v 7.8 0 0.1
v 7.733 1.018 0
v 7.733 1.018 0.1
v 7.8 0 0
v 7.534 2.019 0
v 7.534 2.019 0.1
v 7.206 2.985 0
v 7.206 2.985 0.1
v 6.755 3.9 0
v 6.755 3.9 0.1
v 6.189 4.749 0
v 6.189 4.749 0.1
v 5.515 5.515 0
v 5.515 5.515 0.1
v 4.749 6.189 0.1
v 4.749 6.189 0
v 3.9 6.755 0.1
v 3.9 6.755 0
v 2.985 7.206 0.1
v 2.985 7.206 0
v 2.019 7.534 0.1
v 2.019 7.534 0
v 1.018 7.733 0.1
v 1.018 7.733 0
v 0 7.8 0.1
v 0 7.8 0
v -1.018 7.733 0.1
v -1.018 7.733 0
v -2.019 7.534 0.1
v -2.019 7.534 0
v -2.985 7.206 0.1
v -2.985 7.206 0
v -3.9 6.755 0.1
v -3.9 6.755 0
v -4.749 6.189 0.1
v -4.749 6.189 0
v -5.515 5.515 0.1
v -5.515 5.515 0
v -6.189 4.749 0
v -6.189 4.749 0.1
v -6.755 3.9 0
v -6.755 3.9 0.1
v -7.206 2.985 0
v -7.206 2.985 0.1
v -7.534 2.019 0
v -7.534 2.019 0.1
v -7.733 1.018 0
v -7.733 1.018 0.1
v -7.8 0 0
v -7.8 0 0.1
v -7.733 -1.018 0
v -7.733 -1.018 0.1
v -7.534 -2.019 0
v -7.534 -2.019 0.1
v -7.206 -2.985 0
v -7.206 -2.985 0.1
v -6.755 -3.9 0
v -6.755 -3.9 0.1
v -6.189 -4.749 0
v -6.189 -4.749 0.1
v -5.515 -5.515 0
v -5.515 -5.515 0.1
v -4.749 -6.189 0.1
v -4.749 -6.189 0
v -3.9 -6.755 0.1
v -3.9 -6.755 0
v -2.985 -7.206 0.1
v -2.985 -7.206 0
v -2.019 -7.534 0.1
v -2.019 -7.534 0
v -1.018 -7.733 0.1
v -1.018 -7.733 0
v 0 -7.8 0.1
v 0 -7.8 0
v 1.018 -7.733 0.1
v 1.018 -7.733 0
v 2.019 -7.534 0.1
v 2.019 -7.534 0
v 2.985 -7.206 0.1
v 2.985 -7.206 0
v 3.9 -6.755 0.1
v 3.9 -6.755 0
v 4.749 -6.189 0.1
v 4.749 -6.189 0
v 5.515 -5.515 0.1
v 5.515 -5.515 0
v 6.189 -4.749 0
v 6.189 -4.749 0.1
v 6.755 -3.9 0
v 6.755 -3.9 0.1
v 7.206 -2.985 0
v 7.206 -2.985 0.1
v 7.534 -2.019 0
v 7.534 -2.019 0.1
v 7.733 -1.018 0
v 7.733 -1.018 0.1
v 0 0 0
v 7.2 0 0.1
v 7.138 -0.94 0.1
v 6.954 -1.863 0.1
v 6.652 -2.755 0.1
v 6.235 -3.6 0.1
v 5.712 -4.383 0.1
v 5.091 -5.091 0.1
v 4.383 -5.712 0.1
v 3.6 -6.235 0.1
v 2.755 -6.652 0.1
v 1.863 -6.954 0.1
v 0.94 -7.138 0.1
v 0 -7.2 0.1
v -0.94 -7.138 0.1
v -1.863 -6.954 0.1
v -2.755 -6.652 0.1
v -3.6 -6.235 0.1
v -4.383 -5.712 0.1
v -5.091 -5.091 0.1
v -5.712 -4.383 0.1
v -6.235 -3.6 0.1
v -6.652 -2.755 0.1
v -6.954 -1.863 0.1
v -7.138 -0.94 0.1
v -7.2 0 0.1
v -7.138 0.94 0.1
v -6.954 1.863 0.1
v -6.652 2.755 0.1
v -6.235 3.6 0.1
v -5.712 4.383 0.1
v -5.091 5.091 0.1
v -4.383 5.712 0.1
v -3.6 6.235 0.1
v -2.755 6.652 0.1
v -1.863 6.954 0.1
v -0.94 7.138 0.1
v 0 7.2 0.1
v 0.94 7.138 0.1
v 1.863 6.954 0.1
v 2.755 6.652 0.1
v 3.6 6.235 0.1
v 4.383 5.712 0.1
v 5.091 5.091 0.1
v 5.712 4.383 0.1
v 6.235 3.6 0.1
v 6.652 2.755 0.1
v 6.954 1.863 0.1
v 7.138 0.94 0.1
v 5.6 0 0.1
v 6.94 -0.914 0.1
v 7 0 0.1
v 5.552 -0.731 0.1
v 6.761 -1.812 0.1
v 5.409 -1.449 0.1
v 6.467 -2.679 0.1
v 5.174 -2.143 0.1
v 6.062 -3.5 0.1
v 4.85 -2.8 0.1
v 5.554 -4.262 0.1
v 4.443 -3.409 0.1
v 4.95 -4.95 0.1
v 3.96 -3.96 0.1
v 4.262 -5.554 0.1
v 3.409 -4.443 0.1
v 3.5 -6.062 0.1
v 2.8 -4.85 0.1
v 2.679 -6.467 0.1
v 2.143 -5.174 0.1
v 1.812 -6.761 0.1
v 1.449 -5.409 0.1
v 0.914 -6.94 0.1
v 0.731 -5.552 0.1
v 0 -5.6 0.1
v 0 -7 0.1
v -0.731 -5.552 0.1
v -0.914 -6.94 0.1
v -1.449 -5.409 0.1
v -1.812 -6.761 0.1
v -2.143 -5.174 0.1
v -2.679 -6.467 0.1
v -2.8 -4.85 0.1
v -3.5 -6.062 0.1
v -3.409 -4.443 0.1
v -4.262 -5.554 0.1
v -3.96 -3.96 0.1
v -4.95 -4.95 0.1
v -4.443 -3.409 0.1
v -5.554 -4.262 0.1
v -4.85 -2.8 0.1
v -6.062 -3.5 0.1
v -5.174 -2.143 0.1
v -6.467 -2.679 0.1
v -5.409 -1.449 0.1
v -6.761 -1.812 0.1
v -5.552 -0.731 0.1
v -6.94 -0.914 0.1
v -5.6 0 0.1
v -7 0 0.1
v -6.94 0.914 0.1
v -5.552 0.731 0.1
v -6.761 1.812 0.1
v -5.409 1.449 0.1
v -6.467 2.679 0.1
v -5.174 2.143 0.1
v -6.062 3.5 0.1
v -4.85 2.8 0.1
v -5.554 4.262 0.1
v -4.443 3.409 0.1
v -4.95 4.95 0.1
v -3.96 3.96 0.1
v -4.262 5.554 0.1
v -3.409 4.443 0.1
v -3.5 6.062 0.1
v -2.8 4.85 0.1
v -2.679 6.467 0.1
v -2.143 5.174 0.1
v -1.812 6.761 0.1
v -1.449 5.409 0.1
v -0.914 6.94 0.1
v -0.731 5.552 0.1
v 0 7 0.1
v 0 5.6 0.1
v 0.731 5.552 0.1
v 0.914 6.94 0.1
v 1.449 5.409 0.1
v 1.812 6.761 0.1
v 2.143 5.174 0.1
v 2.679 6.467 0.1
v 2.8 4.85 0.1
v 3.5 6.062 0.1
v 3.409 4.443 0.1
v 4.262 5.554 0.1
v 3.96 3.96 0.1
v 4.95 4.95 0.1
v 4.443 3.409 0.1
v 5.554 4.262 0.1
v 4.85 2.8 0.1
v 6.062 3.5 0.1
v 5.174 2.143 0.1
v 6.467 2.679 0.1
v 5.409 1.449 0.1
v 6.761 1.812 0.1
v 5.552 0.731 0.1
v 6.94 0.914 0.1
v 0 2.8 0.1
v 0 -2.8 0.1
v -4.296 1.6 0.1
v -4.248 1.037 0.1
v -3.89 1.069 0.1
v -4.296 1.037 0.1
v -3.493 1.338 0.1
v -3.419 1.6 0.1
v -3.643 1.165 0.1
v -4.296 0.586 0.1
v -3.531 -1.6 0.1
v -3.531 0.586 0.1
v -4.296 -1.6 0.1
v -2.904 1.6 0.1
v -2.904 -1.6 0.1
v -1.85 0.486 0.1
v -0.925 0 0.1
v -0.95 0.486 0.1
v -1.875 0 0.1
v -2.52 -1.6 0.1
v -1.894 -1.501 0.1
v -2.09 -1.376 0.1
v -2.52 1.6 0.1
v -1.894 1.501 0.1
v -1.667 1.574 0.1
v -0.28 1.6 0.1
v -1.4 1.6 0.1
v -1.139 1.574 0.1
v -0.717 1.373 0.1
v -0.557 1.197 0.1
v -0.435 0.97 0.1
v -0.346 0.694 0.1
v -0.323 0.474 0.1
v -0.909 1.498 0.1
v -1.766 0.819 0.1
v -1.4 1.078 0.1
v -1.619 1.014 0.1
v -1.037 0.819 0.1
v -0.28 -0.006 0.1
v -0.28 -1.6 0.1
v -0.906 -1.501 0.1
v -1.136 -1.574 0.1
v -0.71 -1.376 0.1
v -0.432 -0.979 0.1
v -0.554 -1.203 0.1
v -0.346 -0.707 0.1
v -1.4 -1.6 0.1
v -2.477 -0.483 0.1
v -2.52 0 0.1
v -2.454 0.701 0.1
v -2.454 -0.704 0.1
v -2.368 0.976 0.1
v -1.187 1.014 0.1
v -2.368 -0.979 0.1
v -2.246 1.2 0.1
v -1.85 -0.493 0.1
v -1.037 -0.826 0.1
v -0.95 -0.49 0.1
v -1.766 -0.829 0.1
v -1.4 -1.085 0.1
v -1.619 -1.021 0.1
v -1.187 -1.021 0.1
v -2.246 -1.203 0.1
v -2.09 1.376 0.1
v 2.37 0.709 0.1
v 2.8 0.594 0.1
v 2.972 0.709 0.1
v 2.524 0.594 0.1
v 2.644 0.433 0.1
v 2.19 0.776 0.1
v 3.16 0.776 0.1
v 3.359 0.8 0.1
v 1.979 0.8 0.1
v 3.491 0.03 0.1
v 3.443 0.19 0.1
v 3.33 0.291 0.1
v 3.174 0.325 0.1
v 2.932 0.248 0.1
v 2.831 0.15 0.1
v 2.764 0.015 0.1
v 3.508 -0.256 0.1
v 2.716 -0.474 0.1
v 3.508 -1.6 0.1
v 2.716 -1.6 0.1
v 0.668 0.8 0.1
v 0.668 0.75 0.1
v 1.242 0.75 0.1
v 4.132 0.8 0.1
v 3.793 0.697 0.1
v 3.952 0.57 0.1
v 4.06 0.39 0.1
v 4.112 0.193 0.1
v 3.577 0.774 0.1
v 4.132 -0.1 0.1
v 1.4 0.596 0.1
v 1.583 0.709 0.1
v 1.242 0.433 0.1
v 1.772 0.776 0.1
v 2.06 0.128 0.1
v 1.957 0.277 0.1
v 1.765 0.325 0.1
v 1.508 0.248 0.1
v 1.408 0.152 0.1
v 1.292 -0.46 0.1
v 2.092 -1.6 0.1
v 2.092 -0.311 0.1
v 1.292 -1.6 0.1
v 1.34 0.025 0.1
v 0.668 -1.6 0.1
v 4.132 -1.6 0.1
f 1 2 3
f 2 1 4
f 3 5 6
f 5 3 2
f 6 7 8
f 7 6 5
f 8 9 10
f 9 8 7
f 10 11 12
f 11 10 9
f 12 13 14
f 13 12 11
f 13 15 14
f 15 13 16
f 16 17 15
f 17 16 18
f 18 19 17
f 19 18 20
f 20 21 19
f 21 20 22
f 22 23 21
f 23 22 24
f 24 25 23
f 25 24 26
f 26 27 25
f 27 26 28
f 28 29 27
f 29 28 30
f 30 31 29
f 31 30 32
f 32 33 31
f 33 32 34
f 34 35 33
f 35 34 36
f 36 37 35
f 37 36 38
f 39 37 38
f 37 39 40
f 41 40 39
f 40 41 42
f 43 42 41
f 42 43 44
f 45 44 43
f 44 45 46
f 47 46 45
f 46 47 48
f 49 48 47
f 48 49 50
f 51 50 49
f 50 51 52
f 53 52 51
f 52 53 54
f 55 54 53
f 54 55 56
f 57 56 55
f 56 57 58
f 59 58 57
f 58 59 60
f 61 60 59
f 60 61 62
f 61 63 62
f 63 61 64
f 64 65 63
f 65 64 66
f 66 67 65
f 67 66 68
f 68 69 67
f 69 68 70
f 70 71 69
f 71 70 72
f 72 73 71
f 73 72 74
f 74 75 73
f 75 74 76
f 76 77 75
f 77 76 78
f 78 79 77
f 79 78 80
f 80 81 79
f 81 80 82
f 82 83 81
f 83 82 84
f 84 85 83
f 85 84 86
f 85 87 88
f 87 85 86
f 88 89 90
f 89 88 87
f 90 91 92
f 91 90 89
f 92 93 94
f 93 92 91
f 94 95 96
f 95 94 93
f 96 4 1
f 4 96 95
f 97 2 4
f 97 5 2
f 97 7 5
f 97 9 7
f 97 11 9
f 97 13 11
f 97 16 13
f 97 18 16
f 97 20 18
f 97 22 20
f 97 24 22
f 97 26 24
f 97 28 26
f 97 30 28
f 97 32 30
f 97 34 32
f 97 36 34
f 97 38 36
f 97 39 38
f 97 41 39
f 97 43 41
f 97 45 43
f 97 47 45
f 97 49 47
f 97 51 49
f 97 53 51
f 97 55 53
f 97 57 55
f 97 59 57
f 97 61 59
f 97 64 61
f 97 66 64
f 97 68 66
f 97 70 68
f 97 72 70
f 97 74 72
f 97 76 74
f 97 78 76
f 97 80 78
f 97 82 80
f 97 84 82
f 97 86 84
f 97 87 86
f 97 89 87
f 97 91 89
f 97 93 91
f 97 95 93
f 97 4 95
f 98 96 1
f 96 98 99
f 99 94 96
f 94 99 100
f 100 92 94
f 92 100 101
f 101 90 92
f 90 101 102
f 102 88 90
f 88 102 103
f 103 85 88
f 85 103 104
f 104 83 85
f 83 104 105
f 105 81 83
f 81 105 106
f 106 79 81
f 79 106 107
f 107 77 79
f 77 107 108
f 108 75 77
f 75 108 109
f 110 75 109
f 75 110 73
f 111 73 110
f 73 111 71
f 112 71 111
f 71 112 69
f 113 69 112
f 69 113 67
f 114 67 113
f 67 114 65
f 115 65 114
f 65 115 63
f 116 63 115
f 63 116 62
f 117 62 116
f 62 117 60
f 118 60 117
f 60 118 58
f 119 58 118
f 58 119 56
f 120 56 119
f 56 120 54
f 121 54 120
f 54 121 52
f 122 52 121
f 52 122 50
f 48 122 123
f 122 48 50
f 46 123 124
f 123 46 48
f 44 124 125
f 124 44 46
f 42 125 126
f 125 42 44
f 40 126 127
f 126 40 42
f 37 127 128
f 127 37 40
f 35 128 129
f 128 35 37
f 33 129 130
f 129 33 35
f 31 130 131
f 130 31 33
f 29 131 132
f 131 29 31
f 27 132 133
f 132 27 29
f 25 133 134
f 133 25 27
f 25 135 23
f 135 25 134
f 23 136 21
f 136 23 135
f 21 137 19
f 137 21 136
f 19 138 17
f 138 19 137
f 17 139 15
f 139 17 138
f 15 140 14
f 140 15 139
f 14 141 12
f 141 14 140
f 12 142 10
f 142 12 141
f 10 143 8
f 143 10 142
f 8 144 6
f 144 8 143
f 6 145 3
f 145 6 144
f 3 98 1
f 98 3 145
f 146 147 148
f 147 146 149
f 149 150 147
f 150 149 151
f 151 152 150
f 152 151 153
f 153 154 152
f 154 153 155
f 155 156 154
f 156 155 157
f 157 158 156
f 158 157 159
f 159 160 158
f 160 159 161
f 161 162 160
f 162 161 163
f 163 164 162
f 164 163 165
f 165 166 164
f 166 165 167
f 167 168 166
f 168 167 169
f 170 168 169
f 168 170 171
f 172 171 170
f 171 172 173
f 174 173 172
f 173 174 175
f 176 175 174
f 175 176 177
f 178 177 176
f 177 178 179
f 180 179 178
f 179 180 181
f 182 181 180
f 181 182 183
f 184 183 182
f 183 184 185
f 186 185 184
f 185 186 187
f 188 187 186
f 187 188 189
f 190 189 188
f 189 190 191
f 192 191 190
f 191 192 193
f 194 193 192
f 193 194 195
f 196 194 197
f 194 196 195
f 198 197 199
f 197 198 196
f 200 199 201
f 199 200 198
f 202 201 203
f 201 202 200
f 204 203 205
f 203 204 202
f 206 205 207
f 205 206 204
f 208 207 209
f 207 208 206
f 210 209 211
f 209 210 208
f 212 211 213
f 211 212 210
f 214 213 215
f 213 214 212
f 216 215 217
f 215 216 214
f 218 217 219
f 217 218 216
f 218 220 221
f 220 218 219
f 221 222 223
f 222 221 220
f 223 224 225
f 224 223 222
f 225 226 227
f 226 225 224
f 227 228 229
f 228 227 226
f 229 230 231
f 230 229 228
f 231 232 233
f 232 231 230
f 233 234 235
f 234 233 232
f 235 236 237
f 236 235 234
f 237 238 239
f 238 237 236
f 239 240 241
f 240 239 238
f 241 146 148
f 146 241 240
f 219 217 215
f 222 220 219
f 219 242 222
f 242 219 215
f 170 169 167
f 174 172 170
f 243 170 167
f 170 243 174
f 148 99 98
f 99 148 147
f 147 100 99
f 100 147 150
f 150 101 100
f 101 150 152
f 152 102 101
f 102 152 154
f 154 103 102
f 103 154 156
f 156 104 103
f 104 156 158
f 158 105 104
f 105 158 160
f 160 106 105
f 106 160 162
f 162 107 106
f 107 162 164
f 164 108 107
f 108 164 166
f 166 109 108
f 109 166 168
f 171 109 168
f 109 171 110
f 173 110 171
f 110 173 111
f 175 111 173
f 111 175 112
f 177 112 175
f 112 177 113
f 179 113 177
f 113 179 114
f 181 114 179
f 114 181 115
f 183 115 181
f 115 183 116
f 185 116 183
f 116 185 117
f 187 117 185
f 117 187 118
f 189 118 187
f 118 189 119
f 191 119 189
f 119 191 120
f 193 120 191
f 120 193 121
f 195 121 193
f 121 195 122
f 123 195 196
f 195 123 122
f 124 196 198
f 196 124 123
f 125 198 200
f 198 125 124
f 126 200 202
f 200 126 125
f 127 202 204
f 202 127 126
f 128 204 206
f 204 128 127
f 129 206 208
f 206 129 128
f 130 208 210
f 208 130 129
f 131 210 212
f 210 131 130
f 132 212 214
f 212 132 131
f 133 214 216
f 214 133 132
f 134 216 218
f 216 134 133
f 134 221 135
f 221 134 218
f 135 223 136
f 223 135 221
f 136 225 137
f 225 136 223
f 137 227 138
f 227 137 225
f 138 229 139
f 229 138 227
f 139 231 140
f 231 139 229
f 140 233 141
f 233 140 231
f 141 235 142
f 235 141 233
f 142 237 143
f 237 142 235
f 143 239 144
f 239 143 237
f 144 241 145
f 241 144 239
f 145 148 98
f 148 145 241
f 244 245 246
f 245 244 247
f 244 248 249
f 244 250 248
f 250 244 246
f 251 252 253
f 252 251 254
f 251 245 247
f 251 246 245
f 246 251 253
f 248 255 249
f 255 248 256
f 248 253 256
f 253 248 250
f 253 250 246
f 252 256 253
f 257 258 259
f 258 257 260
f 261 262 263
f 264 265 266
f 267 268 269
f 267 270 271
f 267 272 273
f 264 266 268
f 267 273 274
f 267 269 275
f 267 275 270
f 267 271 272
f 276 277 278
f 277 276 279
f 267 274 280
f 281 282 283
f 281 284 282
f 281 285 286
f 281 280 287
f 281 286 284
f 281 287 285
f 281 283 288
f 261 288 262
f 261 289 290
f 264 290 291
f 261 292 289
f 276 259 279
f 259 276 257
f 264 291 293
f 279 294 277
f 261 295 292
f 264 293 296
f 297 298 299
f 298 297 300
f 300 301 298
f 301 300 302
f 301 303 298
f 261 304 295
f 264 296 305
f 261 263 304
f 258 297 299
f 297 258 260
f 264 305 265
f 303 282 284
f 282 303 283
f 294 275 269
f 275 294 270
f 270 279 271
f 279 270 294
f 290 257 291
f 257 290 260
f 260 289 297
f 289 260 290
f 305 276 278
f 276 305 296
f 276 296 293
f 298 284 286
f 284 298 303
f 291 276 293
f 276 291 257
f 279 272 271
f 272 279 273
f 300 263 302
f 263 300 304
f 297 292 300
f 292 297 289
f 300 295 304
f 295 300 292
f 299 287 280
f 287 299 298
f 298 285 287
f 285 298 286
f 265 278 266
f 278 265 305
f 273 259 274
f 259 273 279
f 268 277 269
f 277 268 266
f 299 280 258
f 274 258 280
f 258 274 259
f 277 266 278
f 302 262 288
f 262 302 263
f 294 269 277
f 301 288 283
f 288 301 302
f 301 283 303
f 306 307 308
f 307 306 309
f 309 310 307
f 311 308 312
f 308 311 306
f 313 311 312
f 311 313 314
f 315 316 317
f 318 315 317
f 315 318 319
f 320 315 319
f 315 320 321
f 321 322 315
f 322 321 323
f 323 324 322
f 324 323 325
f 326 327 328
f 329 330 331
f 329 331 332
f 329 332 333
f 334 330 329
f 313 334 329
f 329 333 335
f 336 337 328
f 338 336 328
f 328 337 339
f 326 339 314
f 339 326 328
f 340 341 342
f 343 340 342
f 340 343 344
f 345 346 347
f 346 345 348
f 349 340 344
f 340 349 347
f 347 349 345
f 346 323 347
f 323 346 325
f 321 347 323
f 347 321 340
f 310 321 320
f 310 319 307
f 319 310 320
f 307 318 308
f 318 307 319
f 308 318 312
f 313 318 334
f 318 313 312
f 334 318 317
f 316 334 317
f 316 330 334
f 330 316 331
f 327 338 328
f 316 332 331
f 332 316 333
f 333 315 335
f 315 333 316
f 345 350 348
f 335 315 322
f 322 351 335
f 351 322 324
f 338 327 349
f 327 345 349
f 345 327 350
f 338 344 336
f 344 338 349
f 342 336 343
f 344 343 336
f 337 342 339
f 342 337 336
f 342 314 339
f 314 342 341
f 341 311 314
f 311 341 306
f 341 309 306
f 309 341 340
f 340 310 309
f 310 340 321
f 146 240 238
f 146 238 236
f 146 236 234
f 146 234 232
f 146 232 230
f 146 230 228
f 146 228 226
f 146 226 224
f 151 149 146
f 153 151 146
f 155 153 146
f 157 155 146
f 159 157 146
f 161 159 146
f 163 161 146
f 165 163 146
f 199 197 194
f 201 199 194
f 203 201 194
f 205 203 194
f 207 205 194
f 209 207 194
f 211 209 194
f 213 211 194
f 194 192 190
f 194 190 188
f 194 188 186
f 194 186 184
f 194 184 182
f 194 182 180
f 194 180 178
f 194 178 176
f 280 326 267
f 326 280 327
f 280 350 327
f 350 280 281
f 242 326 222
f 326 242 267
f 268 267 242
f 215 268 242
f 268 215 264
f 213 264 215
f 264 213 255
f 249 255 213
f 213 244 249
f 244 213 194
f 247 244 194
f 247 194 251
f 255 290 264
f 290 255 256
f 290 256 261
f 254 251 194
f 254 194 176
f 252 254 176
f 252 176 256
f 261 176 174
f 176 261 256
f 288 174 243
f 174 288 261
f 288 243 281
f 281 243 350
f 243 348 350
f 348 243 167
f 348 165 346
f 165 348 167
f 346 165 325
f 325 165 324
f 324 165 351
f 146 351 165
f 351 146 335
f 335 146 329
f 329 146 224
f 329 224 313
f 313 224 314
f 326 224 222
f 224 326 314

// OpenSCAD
use <../lib.scad>
use <../p/48/1-24chrd.scad>
use <../p/48/3-16chrd.scad>
use <../p/48/4-4cyli.scad>
use <../p/48/4-4disc.scad>
use <../p/48/4-4rin12.scad>
use <../p/48/4-4ring35.scad>
use <../p/48/4-4ring4.scad>
use <../p/type-swiss721bt-bold-lm.scad>
use <../p/type-swiss721bt-bold-n0.scad>
use <../p/type-swiss721bt-bold-n1.scad>
function ldraw_lib__169675d() = [
// 0 Sticker  1.9 x  1.9 Round with "10 m" Height Restriction Sign
// 0 Name: 169675d.dat
// 0 Author: Ulrich Röder [UR]
// 0 !LDRAW_ORG Part UPDATE 2019-02
// 0 !LICENSE Licensed under CC BY 2.0 and CC BY 4.0 : see CAreadme.txt
// 
// 0 BFC CERTIFY CCW
  [0,"BFC","CERTIFY"],
  [0,"BFC","CCW"],
// 
// 0 !KEYWORDS Set 4555, Station, Train, Transport
// 
// 0 !HISTORY 2019-09-09 [PTadmin] Official Update 2019-02
// 
// 
// 0 // Main
// 1 16 0 -.25 0 19.5 0 0 0 .25 0 0 0 19.5 48\4-4cyli.dat
  [1,16,0,-.25,0,19.5,0,0,0,.25,0,0,0,19.5, ldraw_lib__48__4_4cyli()],
// 1 16 0 0 0 19.5 0 0 0 -1 0 0 0 19.5 48\4-4disc.dat
  [1,16,0,0,0,19.5,0,0,0,-1,0,0,0,19.5, ldraw_lib__48__4_4disc()],
// 1 16 0 -.25 0 1.5 0 0 0 1 0 0 0 -1.5 48\4-4rin12.dat
  [1,16,0,-.25,0,1.5,0,0,0,1,0,0,0,-1.5, ldraw_lib__48__4_4rin12()],
// 
// 0 // Red
// 1 4 0 -.25 0 3.5 0 0 0 1 0 0 0 -3.5 48\4-4ring4.dat
  [1,4,0,-.25,0,3.5,0,0,0,1,0,0,0,-3.5, ldraw_lib__48__4_4ring4()],
// 
// 0 // Black
// 1 0 0 -.25 0 0 0 -14 0 1 0 14 0 0 48\1-24chrd.dat
  [1,0,0,-.25,0,0,0,-14,0,1,0,14,0,0, ldraw_lib__48__1_24chrd()],
// 1 0 0 -.25 0 0 0 14 0 1 0 14 0 0 48\1-24chrd.dat
  [1,0,0,-.25,0,0,0,14,0,1,0,14,0,0, ldraw_lib__48__1_24chrd()],
// 4 0 3.6232 -.25 13.5226 0 -.25 14 -3.6232 -.25 13.5226 0 -.25 7
  [4,0,3.6232,-.25,13.5226,0,-.25,14,-3.6232,-.25,13.5226,0,-.25,7],
// 1 0 0 -.25 0 0 0 14 0 1 0 -14 0 0 48\1-24chrd.dat
  [1,0,0,-.25,0,0,0,14,0,1,0,-14,0,0, ldraw_lib__48__1_24chrd()],
// 1 0 0 -.25 0 0 0 -14 0 1 0 -14 0 0 48\1-24chrd.dat
  [1,0,0,-.25,0,0,0,-14,0,1,0,-14,0,0, ldraw_lib__48__1_24chrd()],
// 4 0 3.6232 -.25 -13.5226 0 -.25 -7 -3.6232 -.25 -13.5226 0 -.25 -14
  [4,0,3.6232,-.25,-13.5226,0,-.25,-7,-3.6232,-.25,-13.5226,0,-.25,-14],
// 1 0 0 -.25 0 .5 0 0 0 1 0 0 0 -.5 48\4-4ring35.dat
  [1,0,0,-.25,0,.5,0,0,0,1,0,0,0,-.5, ldraw_lib__48__4_4ring35()],
// 
// 0 // White
// 1 15 -9 -.25 0 8 0 0 0 1 0 0 0 8 type-swiss721bt-bold-n1.dat
  [1,15,-9,-.25,0,8,0,0,0,1,0,0,0,8, ldraw_lib__type_swiss721bt_bold_n1()],
// 1 15 -3.5 -.25 0 8 0 0 0 1 0 0 0 8 type-swiss721bt-bold-n0.dat
  [1,15,-3.5,-.25,0,8,0,0,0,1,0,0,0,8, ldraw_lib__type_swiss721bt_bold_n0()],
// 1 15 6 -.25 -1 6 0 0 0 1 0 0 0 6 type-swiss721bt-bold-lm.dat
  [1,15,6,-.25,-1,6,0,0,0,1,0,0,0,6, ldraw_lib__type_swiss721bt_bold_lm()],
// 1 15 0 -.25 0 14 0 0 0 1 0 0 0 14 48\3-16chrd.dat
  [1,15,0,-.25,0,14,0,0,0,1,0,0,0,14, ldraw_lib__48__3_16chrd()],
// 1 15 0 -.25 0 14 0 0 0 1 0 0 0 -14 48\3-16chrd.dat
  [1,15,0,-.25,0,14,0,0,0,1,0,0,0,-14, ldraw_lib__48__3_16chrd()],
// 1 15 0 -.25 0 -14 0 0 0 1 0 0 0 14 48\3-16chrd.dat
  [1,15,0,-.25,0,-14,0,0,0,1,0,0,0,14, ldraw_lib__48__3_16chrd()],
// 1 15 0 -.25 0 -14 0 0 0 1 0 0 0 -14 48\3-16chrd.dat
  [1,15,0,-.25,0,-14,0,0,0,1,0,0,0,-14, ldraw_lib__48__3_16chrd()],
// 4 15 1.671 -.25 2 -.7 -.25 4 -.7 -.25 -.016 1.671 -.25 1.874
  [4,15,1.671,-.25,2,-.7,-.25,4,-.7,-.25,-.016,1.671,-.25,1.874],
// 4 15 -.7 -.25 -4 1.671 -.25 -4 1.671 -.25 1.874 -.7 -.25 -.016
  [4,15,-.7,-.25,-4,1.671,-.25,-4,1.671,-.25,1.874,-.7,-.25,-.016],
// 4 15 -.7 -.25 4 1.671 -.25 2 3.6232 -.25 13.5226 0 -.25 7
  [4,15,-.7,-.25,4,1.671,-.25,2,3.6232,-.25,13.5226,0,-.25,7],
// 3 15 -3.5 -.25 4 -.7 -.25 4 0 -.25 7
  [3,15,-3.5,-.25,4,-.7,-.25,4,0,-.25,7],
// 4 15 -3.6232 -.25 13.5226 -6.3 -.25 4 -3.5 -.25 4 0 -.25 7
  [4,15,-3.6232,-.25,13.5226,-6.3,-.25,4,-3.5,-.25,4,0,-.25,7],
// 4 15 -3.6232 -.25 13.5226 -5.3578 -.25 12.9346 -7.26 -.25 4 -6.3 -.25 4
  [4,15,-3.6232,-.25,13.5226,-5.3578,-.25,12.9346,-7.26,-.25,4,-6.3,-.25,4],
// 3 15 -8.548 -.25 4 -7.26 -.25 4 -5.3578 -.25 12.9346
  [3,15,-8.548,-.25,4,-7.26,-.25,4,-5.3578,-.25,12.9346],
// 3 15 -5.3578 -.25 12.9346 -10.74 -.25 4 -8.548 -.25 4
  [3,15,-5.3578,-.25,12.9346,-10.74,-.25,4,-8.548,-.25,4],
// 3 15 -10.74 -.25 4 -5.3578 -.25 12.9346 -14 -.25 0
  [3,15,-10.74,-.25,4,-5.3578,-.25,12.9346,-14,-.25,0],
// 3 15 -10.74 -.25 2.592 -10.74 -.25 4 -14 -.25 0
  [3,15,-10.74,-.25,2.592,-10.74,-.25,4,-14,-.25,0],
// 3 15 -10.74 -.25 2.592 -14 -.25 0 -10.74 -.25 1.464
  [3,15,-10.74,-.25,2.592,-14,-.25,0,-10.74,-.25,1.464],
// 4 15 -6.3 -.25 4 -7.26 -.25 4 -7.26 -.25 -4 -6.3 -.25 0
  [4,15,-6.3,-.25,4,-7.26,-.25,4,-7.26,-.25,-4,-6.3,-.25,0],
// 3 15 -6.3 -.25 0 -7.26 -.25 -4 -6.3 -.25 -4
  [3,15,-6.3,-.25,0,-7.26,-.25,-4,-6.3,-.25,-4],
// 3 15 -10.74 -.25 -4 -10.74 -.25 1.464 -14 -.25 0
  [3,15,-10.74,-.25,-4,-10.74,-.25,1.464,-14,-.25,0],
// 3 15 -10.74 -.25 -4 -14 -.25 0 -5.3578 -.25 -12.9346
  [3,15,-10.74,-.25,-4,-14,-.25,0,-5.3578,-.25,-12.9346],
// 3 15 -8.828 -.25 -4 -10.74 -.25 -4 -5.3578 -.25 -12.9346
  [3,15,-8.828,-.25,-4,-10.74,-.25,-4,-5.3578,-.25,-12.9346],
// 3 15 -8.828 -.25 -4 -5.3578 -.25 -12.9346 -7.26 -.25 -4
  [3,15,-8.828,-.25,-4,-5.3578,-.25,-12.9346,-7.26,-.25,-4],
// 4 15 -3.6232 -.25 -13.5226 -6.3 -.25 -4 -7.26 -.25 -4 -5.3578 -.25 -12.9346
  [4,15,-3.6232,-.25,-13.5226,-6.3,-.25,-4,-7.26,-.25,-4,-5.3578,-.25,-12.9346],
// 4 15 -3.5 -.25 -4 -6.3 -.25 -4 -3.6232 -.25 -13.5226 0 -.25 -7
  [4,15,-3.5,-.25,-4,-6.3,-.25,-4,-3.6232,-.25,-13.5226,0,-.25,-7],
// 3 15 -3.5 -.25 -4 0 -.25 -7 -.7 -.25 -4
  [3,15,-3.5,-.25,-4,0,-.25,-7,-.7,-.25,-4],
// 3 15 -.7 -.25 -4 0 -.25 -7 1.671 -.25 -4
  [3,15,-.7,-.25,-4,0,-.25,-7,1.671,-.25,-4],
// 4 15 1.671 -.25 -4 0 -.25 -7 3.6232 -.25 -13.5226 3.231 -.25 -4
  [4,15,1.671,-.25,-4,0,-.25,-7,3.6232,-.25,-13.5226,3.231,-.25,-4],
// 4 15 3.6232 -.25 -13.5226 5.3578 -.25 -12.9346 5.229 -.25 -4 3.231 -.25 -4
  [4,15,3.6232,-.25,-13.5226,5.3578,-.25,-12.9346,5.229,-.25,-4,3.231,-.25,-4],
// 3 15 5.229 -.25 -4 5.3578 -.25 -12.9346 6.789 -.25 -4
  [3,15,5.229,-.25,-4,5.3578,-.25,-12.9346,6.789,-.25,-4],
// 3 15 6.789 -.25 -4 5.3578 -.25 -12.9346 8.769 -.25 -4
  [3,15,6.789,-.25,-4,5.3578,-.25,-12.9346,8.769,-.25,-4],
// 3 15 8.769 -.25 -4 5.3578 -.25 -12.9346 10.329 -.25 -4
  [3,15,8.769,-.25,-4,5.3578,-.25,-12.9346,10.329,-.25,-4],
// 3 15 14 -.25 0 10.329 -.25 -4 5.3578 -.25 -12.9346
  [3,15,14,-.25,0,10.329,-.25,-4,5.3578,-.25,-12.9346],
// 3 15 10.329 -.25 -4 14 -.25 0 10.329 -.25 -.25
  [3,15,10.329,-.25,-4,14,-.25,0,10.329,-.25,-.25],
// 3 15 10.329 -.25 -.25 14 -.25 0 10.329 -.25 2
  [3,15,10.329,-.25,-.25,14,-.25,0,10.329,-.25,2],
// 3 15 10.329 -.25 2 14 -.25 0 5.3578 -.25 12.9346
  [3,15,10.329,-.25,2,14,-.25,0,5.3578,-.25,12.9346],
// 3 15 10.329 -.25 2 5.3578 -.25 12.9346 8.397 -.25 2
  [3,15,10.329,-.25,2,5.3578,-.25,12.9346,8.397,-.25,2],
// 3 15 8.397 -.25 2 5.3578 -.25 12.9346 4.947 -.25 2
  [3,15,8.397,-.25,2,5.3578,-.25,12.9346,4.947,-.25,2],
// 4 15 3.6232 -.25 13.5226 1.671 -.25 2 4.947 -.25 2 5.3578 -.25 12.9346
  [4,15,3.6232,-.25,13.5226,1.671,-.25,2,4.947,-.25,2,5.3578,-.25,12.9346],
];
module ldraw_lib__169675d(step=0, col=false, unit=2/5, alt=false, line=0.2, solid=!$preview)
    makepoly(ldraw_lib__169675d(), step=step, col=col, unit=unit, alt=alt, line=line, solid=solid);
ldraw_lib__169675d(line=0.2);
